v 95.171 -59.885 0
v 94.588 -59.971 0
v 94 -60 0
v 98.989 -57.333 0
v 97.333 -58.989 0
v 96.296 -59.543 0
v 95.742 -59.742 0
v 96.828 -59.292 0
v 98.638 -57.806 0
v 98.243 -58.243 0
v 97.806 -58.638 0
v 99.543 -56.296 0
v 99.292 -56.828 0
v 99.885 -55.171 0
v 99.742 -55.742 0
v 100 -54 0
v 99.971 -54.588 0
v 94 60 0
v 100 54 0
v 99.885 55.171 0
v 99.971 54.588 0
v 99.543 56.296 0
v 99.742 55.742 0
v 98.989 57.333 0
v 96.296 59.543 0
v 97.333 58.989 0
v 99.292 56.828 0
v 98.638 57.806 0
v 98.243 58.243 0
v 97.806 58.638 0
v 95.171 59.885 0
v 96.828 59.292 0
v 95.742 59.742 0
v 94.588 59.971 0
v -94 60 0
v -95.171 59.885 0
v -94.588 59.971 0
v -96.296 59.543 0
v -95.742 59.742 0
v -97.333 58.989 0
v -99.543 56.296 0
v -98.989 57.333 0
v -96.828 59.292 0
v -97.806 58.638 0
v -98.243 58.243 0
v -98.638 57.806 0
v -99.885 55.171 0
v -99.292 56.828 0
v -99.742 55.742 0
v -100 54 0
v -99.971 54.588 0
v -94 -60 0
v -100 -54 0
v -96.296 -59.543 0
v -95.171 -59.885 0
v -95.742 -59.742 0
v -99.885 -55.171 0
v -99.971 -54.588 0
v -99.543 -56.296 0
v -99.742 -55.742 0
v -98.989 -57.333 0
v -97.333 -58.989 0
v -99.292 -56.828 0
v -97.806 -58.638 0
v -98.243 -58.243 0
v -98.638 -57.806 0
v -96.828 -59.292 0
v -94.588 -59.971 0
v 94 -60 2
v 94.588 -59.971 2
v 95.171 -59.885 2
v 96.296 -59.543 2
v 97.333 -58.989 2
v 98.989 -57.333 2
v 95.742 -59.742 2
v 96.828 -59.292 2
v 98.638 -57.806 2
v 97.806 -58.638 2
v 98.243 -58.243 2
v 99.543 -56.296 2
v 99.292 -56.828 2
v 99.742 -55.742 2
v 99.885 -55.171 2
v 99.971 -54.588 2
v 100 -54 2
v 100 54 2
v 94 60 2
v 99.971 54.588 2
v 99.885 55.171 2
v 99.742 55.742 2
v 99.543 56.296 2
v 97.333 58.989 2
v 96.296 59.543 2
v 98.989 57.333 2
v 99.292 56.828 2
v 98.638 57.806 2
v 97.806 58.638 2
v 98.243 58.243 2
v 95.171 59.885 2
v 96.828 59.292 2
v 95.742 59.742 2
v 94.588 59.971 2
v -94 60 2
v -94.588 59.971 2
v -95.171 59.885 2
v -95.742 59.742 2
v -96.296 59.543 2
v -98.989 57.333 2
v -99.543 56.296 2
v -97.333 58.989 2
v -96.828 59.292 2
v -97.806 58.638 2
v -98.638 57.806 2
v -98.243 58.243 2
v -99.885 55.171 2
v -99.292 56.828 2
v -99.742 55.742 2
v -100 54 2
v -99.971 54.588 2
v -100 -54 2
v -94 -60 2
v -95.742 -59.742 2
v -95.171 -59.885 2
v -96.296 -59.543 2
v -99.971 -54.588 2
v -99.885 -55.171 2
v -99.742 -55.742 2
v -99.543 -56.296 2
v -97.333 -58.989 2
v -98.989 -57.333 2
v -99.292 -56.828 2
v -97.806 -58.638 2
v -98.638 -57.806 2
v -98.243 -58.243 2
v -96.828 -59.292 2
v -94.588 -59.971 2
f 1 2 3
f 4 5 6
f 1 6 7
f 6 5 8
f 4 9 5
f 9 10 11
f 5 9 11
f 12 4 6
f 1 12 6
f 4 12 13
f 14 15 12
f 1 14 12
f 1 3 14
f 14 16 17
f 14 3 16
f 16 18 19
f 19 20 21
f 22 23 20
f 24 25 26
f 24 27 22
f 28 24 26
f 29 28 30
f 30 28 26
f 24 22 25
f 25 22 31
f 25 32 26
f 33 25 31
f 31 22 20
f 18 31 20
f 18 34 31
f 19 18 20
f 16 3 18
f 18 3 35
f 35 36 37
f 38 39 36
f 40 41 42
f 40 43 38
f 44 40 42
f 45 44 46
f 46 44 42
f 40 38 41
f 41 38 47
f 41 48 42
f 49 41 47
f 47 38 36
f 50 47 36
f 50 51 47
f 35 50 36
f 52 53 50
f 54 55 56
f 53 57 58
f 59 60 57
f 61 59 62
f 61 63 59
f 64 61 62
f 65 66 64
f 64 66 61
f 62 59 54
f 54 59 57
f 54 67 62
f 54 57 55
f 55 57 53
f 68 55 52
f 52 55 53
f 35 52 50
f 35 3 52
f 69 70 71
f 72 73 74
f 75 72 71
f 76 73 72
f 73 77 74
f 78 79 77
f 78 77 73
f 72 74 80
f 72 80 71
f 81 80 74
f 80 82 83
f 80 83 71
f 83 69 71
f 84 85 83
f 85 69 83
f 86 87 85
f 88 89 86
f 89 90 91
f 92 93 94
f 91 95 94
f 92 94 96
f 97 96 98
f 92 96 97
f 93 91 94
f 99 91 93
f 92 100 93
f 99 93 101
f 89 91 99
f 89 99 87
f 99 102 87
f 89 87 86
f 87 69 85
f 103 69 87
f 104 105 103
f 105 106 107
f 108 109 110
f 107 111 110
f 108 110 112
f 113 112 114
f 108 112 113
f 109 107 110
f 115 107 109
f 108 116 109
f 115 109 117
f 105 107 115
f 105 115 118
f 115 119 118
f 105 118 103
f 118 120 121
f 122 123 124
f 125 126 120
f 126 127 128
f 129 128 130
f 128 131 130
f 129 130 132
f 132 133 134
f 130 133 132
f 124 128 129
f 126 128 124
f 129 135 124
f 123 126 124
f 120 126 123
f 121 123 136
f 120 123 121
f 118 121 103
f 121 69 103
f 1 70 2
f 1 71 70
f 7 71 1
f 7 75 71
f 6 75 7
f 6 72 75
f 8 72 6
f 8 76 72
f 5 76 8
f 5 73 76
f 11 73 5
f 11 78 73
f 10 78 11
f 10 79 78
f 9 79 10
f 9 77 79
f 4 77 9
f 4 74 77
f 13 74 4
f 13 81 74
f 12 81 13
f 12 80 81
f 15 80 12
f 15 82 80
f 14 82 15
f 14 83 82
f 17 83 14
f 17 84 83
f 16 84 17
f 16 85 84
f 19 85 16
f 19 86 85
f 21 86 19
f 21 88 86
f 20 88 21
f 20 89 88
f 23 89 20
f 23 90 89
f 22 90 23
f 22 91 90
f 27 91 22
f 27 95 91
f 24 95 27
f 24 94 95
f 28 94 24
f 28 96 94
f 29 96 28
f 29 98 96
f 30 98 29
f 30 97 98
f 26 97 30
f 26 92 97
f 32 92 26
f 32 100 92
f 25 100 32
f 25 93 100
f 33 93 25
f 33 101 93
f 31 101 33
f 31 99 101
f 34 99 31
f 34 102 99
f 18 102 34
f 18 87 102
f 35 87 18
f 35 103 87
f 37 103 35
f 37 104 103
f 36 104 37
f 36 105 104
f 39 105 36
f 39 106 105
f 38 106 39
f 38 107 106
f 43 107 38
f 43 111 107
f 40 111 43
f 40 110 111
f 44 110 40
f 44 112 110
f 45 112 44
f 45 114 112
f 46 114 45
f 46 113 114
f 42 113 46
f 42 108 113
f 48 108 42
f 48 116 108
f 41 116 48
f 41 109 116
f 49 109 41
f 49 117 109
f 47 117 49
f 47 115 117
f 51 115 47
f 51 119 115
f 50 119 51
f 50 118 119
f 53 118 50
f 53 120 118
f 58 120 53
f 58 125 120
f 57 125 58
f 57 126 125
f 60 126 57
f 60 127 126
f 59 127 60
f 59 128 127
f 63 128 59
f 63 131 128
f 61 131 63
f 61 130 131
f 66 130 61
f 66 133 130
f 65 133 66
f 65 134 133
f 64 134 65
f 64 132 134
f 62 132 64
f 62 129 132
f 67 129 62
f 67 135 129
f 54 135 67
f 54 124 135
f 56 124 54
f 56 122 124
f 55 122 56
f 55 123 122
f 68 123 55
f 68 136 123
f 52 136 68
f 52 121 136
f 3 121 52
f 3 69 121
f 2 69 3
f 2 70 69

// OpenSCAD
$fn = 64;

length = 200;
width  = 120;
thickness = 2;

corner_radius = 6;

module rounded_sheet(l, w, t, r){
    r2 = min(r, min(l, w)/2);
    linear_extrude(height = t)
        offset(r = r2)
            square([l - 2*r2, w - 2*r2], center = true);
}

color([0.08, 0.08, 0.09])
    rounded_sheet(length, width, thickness, corner_radius);
